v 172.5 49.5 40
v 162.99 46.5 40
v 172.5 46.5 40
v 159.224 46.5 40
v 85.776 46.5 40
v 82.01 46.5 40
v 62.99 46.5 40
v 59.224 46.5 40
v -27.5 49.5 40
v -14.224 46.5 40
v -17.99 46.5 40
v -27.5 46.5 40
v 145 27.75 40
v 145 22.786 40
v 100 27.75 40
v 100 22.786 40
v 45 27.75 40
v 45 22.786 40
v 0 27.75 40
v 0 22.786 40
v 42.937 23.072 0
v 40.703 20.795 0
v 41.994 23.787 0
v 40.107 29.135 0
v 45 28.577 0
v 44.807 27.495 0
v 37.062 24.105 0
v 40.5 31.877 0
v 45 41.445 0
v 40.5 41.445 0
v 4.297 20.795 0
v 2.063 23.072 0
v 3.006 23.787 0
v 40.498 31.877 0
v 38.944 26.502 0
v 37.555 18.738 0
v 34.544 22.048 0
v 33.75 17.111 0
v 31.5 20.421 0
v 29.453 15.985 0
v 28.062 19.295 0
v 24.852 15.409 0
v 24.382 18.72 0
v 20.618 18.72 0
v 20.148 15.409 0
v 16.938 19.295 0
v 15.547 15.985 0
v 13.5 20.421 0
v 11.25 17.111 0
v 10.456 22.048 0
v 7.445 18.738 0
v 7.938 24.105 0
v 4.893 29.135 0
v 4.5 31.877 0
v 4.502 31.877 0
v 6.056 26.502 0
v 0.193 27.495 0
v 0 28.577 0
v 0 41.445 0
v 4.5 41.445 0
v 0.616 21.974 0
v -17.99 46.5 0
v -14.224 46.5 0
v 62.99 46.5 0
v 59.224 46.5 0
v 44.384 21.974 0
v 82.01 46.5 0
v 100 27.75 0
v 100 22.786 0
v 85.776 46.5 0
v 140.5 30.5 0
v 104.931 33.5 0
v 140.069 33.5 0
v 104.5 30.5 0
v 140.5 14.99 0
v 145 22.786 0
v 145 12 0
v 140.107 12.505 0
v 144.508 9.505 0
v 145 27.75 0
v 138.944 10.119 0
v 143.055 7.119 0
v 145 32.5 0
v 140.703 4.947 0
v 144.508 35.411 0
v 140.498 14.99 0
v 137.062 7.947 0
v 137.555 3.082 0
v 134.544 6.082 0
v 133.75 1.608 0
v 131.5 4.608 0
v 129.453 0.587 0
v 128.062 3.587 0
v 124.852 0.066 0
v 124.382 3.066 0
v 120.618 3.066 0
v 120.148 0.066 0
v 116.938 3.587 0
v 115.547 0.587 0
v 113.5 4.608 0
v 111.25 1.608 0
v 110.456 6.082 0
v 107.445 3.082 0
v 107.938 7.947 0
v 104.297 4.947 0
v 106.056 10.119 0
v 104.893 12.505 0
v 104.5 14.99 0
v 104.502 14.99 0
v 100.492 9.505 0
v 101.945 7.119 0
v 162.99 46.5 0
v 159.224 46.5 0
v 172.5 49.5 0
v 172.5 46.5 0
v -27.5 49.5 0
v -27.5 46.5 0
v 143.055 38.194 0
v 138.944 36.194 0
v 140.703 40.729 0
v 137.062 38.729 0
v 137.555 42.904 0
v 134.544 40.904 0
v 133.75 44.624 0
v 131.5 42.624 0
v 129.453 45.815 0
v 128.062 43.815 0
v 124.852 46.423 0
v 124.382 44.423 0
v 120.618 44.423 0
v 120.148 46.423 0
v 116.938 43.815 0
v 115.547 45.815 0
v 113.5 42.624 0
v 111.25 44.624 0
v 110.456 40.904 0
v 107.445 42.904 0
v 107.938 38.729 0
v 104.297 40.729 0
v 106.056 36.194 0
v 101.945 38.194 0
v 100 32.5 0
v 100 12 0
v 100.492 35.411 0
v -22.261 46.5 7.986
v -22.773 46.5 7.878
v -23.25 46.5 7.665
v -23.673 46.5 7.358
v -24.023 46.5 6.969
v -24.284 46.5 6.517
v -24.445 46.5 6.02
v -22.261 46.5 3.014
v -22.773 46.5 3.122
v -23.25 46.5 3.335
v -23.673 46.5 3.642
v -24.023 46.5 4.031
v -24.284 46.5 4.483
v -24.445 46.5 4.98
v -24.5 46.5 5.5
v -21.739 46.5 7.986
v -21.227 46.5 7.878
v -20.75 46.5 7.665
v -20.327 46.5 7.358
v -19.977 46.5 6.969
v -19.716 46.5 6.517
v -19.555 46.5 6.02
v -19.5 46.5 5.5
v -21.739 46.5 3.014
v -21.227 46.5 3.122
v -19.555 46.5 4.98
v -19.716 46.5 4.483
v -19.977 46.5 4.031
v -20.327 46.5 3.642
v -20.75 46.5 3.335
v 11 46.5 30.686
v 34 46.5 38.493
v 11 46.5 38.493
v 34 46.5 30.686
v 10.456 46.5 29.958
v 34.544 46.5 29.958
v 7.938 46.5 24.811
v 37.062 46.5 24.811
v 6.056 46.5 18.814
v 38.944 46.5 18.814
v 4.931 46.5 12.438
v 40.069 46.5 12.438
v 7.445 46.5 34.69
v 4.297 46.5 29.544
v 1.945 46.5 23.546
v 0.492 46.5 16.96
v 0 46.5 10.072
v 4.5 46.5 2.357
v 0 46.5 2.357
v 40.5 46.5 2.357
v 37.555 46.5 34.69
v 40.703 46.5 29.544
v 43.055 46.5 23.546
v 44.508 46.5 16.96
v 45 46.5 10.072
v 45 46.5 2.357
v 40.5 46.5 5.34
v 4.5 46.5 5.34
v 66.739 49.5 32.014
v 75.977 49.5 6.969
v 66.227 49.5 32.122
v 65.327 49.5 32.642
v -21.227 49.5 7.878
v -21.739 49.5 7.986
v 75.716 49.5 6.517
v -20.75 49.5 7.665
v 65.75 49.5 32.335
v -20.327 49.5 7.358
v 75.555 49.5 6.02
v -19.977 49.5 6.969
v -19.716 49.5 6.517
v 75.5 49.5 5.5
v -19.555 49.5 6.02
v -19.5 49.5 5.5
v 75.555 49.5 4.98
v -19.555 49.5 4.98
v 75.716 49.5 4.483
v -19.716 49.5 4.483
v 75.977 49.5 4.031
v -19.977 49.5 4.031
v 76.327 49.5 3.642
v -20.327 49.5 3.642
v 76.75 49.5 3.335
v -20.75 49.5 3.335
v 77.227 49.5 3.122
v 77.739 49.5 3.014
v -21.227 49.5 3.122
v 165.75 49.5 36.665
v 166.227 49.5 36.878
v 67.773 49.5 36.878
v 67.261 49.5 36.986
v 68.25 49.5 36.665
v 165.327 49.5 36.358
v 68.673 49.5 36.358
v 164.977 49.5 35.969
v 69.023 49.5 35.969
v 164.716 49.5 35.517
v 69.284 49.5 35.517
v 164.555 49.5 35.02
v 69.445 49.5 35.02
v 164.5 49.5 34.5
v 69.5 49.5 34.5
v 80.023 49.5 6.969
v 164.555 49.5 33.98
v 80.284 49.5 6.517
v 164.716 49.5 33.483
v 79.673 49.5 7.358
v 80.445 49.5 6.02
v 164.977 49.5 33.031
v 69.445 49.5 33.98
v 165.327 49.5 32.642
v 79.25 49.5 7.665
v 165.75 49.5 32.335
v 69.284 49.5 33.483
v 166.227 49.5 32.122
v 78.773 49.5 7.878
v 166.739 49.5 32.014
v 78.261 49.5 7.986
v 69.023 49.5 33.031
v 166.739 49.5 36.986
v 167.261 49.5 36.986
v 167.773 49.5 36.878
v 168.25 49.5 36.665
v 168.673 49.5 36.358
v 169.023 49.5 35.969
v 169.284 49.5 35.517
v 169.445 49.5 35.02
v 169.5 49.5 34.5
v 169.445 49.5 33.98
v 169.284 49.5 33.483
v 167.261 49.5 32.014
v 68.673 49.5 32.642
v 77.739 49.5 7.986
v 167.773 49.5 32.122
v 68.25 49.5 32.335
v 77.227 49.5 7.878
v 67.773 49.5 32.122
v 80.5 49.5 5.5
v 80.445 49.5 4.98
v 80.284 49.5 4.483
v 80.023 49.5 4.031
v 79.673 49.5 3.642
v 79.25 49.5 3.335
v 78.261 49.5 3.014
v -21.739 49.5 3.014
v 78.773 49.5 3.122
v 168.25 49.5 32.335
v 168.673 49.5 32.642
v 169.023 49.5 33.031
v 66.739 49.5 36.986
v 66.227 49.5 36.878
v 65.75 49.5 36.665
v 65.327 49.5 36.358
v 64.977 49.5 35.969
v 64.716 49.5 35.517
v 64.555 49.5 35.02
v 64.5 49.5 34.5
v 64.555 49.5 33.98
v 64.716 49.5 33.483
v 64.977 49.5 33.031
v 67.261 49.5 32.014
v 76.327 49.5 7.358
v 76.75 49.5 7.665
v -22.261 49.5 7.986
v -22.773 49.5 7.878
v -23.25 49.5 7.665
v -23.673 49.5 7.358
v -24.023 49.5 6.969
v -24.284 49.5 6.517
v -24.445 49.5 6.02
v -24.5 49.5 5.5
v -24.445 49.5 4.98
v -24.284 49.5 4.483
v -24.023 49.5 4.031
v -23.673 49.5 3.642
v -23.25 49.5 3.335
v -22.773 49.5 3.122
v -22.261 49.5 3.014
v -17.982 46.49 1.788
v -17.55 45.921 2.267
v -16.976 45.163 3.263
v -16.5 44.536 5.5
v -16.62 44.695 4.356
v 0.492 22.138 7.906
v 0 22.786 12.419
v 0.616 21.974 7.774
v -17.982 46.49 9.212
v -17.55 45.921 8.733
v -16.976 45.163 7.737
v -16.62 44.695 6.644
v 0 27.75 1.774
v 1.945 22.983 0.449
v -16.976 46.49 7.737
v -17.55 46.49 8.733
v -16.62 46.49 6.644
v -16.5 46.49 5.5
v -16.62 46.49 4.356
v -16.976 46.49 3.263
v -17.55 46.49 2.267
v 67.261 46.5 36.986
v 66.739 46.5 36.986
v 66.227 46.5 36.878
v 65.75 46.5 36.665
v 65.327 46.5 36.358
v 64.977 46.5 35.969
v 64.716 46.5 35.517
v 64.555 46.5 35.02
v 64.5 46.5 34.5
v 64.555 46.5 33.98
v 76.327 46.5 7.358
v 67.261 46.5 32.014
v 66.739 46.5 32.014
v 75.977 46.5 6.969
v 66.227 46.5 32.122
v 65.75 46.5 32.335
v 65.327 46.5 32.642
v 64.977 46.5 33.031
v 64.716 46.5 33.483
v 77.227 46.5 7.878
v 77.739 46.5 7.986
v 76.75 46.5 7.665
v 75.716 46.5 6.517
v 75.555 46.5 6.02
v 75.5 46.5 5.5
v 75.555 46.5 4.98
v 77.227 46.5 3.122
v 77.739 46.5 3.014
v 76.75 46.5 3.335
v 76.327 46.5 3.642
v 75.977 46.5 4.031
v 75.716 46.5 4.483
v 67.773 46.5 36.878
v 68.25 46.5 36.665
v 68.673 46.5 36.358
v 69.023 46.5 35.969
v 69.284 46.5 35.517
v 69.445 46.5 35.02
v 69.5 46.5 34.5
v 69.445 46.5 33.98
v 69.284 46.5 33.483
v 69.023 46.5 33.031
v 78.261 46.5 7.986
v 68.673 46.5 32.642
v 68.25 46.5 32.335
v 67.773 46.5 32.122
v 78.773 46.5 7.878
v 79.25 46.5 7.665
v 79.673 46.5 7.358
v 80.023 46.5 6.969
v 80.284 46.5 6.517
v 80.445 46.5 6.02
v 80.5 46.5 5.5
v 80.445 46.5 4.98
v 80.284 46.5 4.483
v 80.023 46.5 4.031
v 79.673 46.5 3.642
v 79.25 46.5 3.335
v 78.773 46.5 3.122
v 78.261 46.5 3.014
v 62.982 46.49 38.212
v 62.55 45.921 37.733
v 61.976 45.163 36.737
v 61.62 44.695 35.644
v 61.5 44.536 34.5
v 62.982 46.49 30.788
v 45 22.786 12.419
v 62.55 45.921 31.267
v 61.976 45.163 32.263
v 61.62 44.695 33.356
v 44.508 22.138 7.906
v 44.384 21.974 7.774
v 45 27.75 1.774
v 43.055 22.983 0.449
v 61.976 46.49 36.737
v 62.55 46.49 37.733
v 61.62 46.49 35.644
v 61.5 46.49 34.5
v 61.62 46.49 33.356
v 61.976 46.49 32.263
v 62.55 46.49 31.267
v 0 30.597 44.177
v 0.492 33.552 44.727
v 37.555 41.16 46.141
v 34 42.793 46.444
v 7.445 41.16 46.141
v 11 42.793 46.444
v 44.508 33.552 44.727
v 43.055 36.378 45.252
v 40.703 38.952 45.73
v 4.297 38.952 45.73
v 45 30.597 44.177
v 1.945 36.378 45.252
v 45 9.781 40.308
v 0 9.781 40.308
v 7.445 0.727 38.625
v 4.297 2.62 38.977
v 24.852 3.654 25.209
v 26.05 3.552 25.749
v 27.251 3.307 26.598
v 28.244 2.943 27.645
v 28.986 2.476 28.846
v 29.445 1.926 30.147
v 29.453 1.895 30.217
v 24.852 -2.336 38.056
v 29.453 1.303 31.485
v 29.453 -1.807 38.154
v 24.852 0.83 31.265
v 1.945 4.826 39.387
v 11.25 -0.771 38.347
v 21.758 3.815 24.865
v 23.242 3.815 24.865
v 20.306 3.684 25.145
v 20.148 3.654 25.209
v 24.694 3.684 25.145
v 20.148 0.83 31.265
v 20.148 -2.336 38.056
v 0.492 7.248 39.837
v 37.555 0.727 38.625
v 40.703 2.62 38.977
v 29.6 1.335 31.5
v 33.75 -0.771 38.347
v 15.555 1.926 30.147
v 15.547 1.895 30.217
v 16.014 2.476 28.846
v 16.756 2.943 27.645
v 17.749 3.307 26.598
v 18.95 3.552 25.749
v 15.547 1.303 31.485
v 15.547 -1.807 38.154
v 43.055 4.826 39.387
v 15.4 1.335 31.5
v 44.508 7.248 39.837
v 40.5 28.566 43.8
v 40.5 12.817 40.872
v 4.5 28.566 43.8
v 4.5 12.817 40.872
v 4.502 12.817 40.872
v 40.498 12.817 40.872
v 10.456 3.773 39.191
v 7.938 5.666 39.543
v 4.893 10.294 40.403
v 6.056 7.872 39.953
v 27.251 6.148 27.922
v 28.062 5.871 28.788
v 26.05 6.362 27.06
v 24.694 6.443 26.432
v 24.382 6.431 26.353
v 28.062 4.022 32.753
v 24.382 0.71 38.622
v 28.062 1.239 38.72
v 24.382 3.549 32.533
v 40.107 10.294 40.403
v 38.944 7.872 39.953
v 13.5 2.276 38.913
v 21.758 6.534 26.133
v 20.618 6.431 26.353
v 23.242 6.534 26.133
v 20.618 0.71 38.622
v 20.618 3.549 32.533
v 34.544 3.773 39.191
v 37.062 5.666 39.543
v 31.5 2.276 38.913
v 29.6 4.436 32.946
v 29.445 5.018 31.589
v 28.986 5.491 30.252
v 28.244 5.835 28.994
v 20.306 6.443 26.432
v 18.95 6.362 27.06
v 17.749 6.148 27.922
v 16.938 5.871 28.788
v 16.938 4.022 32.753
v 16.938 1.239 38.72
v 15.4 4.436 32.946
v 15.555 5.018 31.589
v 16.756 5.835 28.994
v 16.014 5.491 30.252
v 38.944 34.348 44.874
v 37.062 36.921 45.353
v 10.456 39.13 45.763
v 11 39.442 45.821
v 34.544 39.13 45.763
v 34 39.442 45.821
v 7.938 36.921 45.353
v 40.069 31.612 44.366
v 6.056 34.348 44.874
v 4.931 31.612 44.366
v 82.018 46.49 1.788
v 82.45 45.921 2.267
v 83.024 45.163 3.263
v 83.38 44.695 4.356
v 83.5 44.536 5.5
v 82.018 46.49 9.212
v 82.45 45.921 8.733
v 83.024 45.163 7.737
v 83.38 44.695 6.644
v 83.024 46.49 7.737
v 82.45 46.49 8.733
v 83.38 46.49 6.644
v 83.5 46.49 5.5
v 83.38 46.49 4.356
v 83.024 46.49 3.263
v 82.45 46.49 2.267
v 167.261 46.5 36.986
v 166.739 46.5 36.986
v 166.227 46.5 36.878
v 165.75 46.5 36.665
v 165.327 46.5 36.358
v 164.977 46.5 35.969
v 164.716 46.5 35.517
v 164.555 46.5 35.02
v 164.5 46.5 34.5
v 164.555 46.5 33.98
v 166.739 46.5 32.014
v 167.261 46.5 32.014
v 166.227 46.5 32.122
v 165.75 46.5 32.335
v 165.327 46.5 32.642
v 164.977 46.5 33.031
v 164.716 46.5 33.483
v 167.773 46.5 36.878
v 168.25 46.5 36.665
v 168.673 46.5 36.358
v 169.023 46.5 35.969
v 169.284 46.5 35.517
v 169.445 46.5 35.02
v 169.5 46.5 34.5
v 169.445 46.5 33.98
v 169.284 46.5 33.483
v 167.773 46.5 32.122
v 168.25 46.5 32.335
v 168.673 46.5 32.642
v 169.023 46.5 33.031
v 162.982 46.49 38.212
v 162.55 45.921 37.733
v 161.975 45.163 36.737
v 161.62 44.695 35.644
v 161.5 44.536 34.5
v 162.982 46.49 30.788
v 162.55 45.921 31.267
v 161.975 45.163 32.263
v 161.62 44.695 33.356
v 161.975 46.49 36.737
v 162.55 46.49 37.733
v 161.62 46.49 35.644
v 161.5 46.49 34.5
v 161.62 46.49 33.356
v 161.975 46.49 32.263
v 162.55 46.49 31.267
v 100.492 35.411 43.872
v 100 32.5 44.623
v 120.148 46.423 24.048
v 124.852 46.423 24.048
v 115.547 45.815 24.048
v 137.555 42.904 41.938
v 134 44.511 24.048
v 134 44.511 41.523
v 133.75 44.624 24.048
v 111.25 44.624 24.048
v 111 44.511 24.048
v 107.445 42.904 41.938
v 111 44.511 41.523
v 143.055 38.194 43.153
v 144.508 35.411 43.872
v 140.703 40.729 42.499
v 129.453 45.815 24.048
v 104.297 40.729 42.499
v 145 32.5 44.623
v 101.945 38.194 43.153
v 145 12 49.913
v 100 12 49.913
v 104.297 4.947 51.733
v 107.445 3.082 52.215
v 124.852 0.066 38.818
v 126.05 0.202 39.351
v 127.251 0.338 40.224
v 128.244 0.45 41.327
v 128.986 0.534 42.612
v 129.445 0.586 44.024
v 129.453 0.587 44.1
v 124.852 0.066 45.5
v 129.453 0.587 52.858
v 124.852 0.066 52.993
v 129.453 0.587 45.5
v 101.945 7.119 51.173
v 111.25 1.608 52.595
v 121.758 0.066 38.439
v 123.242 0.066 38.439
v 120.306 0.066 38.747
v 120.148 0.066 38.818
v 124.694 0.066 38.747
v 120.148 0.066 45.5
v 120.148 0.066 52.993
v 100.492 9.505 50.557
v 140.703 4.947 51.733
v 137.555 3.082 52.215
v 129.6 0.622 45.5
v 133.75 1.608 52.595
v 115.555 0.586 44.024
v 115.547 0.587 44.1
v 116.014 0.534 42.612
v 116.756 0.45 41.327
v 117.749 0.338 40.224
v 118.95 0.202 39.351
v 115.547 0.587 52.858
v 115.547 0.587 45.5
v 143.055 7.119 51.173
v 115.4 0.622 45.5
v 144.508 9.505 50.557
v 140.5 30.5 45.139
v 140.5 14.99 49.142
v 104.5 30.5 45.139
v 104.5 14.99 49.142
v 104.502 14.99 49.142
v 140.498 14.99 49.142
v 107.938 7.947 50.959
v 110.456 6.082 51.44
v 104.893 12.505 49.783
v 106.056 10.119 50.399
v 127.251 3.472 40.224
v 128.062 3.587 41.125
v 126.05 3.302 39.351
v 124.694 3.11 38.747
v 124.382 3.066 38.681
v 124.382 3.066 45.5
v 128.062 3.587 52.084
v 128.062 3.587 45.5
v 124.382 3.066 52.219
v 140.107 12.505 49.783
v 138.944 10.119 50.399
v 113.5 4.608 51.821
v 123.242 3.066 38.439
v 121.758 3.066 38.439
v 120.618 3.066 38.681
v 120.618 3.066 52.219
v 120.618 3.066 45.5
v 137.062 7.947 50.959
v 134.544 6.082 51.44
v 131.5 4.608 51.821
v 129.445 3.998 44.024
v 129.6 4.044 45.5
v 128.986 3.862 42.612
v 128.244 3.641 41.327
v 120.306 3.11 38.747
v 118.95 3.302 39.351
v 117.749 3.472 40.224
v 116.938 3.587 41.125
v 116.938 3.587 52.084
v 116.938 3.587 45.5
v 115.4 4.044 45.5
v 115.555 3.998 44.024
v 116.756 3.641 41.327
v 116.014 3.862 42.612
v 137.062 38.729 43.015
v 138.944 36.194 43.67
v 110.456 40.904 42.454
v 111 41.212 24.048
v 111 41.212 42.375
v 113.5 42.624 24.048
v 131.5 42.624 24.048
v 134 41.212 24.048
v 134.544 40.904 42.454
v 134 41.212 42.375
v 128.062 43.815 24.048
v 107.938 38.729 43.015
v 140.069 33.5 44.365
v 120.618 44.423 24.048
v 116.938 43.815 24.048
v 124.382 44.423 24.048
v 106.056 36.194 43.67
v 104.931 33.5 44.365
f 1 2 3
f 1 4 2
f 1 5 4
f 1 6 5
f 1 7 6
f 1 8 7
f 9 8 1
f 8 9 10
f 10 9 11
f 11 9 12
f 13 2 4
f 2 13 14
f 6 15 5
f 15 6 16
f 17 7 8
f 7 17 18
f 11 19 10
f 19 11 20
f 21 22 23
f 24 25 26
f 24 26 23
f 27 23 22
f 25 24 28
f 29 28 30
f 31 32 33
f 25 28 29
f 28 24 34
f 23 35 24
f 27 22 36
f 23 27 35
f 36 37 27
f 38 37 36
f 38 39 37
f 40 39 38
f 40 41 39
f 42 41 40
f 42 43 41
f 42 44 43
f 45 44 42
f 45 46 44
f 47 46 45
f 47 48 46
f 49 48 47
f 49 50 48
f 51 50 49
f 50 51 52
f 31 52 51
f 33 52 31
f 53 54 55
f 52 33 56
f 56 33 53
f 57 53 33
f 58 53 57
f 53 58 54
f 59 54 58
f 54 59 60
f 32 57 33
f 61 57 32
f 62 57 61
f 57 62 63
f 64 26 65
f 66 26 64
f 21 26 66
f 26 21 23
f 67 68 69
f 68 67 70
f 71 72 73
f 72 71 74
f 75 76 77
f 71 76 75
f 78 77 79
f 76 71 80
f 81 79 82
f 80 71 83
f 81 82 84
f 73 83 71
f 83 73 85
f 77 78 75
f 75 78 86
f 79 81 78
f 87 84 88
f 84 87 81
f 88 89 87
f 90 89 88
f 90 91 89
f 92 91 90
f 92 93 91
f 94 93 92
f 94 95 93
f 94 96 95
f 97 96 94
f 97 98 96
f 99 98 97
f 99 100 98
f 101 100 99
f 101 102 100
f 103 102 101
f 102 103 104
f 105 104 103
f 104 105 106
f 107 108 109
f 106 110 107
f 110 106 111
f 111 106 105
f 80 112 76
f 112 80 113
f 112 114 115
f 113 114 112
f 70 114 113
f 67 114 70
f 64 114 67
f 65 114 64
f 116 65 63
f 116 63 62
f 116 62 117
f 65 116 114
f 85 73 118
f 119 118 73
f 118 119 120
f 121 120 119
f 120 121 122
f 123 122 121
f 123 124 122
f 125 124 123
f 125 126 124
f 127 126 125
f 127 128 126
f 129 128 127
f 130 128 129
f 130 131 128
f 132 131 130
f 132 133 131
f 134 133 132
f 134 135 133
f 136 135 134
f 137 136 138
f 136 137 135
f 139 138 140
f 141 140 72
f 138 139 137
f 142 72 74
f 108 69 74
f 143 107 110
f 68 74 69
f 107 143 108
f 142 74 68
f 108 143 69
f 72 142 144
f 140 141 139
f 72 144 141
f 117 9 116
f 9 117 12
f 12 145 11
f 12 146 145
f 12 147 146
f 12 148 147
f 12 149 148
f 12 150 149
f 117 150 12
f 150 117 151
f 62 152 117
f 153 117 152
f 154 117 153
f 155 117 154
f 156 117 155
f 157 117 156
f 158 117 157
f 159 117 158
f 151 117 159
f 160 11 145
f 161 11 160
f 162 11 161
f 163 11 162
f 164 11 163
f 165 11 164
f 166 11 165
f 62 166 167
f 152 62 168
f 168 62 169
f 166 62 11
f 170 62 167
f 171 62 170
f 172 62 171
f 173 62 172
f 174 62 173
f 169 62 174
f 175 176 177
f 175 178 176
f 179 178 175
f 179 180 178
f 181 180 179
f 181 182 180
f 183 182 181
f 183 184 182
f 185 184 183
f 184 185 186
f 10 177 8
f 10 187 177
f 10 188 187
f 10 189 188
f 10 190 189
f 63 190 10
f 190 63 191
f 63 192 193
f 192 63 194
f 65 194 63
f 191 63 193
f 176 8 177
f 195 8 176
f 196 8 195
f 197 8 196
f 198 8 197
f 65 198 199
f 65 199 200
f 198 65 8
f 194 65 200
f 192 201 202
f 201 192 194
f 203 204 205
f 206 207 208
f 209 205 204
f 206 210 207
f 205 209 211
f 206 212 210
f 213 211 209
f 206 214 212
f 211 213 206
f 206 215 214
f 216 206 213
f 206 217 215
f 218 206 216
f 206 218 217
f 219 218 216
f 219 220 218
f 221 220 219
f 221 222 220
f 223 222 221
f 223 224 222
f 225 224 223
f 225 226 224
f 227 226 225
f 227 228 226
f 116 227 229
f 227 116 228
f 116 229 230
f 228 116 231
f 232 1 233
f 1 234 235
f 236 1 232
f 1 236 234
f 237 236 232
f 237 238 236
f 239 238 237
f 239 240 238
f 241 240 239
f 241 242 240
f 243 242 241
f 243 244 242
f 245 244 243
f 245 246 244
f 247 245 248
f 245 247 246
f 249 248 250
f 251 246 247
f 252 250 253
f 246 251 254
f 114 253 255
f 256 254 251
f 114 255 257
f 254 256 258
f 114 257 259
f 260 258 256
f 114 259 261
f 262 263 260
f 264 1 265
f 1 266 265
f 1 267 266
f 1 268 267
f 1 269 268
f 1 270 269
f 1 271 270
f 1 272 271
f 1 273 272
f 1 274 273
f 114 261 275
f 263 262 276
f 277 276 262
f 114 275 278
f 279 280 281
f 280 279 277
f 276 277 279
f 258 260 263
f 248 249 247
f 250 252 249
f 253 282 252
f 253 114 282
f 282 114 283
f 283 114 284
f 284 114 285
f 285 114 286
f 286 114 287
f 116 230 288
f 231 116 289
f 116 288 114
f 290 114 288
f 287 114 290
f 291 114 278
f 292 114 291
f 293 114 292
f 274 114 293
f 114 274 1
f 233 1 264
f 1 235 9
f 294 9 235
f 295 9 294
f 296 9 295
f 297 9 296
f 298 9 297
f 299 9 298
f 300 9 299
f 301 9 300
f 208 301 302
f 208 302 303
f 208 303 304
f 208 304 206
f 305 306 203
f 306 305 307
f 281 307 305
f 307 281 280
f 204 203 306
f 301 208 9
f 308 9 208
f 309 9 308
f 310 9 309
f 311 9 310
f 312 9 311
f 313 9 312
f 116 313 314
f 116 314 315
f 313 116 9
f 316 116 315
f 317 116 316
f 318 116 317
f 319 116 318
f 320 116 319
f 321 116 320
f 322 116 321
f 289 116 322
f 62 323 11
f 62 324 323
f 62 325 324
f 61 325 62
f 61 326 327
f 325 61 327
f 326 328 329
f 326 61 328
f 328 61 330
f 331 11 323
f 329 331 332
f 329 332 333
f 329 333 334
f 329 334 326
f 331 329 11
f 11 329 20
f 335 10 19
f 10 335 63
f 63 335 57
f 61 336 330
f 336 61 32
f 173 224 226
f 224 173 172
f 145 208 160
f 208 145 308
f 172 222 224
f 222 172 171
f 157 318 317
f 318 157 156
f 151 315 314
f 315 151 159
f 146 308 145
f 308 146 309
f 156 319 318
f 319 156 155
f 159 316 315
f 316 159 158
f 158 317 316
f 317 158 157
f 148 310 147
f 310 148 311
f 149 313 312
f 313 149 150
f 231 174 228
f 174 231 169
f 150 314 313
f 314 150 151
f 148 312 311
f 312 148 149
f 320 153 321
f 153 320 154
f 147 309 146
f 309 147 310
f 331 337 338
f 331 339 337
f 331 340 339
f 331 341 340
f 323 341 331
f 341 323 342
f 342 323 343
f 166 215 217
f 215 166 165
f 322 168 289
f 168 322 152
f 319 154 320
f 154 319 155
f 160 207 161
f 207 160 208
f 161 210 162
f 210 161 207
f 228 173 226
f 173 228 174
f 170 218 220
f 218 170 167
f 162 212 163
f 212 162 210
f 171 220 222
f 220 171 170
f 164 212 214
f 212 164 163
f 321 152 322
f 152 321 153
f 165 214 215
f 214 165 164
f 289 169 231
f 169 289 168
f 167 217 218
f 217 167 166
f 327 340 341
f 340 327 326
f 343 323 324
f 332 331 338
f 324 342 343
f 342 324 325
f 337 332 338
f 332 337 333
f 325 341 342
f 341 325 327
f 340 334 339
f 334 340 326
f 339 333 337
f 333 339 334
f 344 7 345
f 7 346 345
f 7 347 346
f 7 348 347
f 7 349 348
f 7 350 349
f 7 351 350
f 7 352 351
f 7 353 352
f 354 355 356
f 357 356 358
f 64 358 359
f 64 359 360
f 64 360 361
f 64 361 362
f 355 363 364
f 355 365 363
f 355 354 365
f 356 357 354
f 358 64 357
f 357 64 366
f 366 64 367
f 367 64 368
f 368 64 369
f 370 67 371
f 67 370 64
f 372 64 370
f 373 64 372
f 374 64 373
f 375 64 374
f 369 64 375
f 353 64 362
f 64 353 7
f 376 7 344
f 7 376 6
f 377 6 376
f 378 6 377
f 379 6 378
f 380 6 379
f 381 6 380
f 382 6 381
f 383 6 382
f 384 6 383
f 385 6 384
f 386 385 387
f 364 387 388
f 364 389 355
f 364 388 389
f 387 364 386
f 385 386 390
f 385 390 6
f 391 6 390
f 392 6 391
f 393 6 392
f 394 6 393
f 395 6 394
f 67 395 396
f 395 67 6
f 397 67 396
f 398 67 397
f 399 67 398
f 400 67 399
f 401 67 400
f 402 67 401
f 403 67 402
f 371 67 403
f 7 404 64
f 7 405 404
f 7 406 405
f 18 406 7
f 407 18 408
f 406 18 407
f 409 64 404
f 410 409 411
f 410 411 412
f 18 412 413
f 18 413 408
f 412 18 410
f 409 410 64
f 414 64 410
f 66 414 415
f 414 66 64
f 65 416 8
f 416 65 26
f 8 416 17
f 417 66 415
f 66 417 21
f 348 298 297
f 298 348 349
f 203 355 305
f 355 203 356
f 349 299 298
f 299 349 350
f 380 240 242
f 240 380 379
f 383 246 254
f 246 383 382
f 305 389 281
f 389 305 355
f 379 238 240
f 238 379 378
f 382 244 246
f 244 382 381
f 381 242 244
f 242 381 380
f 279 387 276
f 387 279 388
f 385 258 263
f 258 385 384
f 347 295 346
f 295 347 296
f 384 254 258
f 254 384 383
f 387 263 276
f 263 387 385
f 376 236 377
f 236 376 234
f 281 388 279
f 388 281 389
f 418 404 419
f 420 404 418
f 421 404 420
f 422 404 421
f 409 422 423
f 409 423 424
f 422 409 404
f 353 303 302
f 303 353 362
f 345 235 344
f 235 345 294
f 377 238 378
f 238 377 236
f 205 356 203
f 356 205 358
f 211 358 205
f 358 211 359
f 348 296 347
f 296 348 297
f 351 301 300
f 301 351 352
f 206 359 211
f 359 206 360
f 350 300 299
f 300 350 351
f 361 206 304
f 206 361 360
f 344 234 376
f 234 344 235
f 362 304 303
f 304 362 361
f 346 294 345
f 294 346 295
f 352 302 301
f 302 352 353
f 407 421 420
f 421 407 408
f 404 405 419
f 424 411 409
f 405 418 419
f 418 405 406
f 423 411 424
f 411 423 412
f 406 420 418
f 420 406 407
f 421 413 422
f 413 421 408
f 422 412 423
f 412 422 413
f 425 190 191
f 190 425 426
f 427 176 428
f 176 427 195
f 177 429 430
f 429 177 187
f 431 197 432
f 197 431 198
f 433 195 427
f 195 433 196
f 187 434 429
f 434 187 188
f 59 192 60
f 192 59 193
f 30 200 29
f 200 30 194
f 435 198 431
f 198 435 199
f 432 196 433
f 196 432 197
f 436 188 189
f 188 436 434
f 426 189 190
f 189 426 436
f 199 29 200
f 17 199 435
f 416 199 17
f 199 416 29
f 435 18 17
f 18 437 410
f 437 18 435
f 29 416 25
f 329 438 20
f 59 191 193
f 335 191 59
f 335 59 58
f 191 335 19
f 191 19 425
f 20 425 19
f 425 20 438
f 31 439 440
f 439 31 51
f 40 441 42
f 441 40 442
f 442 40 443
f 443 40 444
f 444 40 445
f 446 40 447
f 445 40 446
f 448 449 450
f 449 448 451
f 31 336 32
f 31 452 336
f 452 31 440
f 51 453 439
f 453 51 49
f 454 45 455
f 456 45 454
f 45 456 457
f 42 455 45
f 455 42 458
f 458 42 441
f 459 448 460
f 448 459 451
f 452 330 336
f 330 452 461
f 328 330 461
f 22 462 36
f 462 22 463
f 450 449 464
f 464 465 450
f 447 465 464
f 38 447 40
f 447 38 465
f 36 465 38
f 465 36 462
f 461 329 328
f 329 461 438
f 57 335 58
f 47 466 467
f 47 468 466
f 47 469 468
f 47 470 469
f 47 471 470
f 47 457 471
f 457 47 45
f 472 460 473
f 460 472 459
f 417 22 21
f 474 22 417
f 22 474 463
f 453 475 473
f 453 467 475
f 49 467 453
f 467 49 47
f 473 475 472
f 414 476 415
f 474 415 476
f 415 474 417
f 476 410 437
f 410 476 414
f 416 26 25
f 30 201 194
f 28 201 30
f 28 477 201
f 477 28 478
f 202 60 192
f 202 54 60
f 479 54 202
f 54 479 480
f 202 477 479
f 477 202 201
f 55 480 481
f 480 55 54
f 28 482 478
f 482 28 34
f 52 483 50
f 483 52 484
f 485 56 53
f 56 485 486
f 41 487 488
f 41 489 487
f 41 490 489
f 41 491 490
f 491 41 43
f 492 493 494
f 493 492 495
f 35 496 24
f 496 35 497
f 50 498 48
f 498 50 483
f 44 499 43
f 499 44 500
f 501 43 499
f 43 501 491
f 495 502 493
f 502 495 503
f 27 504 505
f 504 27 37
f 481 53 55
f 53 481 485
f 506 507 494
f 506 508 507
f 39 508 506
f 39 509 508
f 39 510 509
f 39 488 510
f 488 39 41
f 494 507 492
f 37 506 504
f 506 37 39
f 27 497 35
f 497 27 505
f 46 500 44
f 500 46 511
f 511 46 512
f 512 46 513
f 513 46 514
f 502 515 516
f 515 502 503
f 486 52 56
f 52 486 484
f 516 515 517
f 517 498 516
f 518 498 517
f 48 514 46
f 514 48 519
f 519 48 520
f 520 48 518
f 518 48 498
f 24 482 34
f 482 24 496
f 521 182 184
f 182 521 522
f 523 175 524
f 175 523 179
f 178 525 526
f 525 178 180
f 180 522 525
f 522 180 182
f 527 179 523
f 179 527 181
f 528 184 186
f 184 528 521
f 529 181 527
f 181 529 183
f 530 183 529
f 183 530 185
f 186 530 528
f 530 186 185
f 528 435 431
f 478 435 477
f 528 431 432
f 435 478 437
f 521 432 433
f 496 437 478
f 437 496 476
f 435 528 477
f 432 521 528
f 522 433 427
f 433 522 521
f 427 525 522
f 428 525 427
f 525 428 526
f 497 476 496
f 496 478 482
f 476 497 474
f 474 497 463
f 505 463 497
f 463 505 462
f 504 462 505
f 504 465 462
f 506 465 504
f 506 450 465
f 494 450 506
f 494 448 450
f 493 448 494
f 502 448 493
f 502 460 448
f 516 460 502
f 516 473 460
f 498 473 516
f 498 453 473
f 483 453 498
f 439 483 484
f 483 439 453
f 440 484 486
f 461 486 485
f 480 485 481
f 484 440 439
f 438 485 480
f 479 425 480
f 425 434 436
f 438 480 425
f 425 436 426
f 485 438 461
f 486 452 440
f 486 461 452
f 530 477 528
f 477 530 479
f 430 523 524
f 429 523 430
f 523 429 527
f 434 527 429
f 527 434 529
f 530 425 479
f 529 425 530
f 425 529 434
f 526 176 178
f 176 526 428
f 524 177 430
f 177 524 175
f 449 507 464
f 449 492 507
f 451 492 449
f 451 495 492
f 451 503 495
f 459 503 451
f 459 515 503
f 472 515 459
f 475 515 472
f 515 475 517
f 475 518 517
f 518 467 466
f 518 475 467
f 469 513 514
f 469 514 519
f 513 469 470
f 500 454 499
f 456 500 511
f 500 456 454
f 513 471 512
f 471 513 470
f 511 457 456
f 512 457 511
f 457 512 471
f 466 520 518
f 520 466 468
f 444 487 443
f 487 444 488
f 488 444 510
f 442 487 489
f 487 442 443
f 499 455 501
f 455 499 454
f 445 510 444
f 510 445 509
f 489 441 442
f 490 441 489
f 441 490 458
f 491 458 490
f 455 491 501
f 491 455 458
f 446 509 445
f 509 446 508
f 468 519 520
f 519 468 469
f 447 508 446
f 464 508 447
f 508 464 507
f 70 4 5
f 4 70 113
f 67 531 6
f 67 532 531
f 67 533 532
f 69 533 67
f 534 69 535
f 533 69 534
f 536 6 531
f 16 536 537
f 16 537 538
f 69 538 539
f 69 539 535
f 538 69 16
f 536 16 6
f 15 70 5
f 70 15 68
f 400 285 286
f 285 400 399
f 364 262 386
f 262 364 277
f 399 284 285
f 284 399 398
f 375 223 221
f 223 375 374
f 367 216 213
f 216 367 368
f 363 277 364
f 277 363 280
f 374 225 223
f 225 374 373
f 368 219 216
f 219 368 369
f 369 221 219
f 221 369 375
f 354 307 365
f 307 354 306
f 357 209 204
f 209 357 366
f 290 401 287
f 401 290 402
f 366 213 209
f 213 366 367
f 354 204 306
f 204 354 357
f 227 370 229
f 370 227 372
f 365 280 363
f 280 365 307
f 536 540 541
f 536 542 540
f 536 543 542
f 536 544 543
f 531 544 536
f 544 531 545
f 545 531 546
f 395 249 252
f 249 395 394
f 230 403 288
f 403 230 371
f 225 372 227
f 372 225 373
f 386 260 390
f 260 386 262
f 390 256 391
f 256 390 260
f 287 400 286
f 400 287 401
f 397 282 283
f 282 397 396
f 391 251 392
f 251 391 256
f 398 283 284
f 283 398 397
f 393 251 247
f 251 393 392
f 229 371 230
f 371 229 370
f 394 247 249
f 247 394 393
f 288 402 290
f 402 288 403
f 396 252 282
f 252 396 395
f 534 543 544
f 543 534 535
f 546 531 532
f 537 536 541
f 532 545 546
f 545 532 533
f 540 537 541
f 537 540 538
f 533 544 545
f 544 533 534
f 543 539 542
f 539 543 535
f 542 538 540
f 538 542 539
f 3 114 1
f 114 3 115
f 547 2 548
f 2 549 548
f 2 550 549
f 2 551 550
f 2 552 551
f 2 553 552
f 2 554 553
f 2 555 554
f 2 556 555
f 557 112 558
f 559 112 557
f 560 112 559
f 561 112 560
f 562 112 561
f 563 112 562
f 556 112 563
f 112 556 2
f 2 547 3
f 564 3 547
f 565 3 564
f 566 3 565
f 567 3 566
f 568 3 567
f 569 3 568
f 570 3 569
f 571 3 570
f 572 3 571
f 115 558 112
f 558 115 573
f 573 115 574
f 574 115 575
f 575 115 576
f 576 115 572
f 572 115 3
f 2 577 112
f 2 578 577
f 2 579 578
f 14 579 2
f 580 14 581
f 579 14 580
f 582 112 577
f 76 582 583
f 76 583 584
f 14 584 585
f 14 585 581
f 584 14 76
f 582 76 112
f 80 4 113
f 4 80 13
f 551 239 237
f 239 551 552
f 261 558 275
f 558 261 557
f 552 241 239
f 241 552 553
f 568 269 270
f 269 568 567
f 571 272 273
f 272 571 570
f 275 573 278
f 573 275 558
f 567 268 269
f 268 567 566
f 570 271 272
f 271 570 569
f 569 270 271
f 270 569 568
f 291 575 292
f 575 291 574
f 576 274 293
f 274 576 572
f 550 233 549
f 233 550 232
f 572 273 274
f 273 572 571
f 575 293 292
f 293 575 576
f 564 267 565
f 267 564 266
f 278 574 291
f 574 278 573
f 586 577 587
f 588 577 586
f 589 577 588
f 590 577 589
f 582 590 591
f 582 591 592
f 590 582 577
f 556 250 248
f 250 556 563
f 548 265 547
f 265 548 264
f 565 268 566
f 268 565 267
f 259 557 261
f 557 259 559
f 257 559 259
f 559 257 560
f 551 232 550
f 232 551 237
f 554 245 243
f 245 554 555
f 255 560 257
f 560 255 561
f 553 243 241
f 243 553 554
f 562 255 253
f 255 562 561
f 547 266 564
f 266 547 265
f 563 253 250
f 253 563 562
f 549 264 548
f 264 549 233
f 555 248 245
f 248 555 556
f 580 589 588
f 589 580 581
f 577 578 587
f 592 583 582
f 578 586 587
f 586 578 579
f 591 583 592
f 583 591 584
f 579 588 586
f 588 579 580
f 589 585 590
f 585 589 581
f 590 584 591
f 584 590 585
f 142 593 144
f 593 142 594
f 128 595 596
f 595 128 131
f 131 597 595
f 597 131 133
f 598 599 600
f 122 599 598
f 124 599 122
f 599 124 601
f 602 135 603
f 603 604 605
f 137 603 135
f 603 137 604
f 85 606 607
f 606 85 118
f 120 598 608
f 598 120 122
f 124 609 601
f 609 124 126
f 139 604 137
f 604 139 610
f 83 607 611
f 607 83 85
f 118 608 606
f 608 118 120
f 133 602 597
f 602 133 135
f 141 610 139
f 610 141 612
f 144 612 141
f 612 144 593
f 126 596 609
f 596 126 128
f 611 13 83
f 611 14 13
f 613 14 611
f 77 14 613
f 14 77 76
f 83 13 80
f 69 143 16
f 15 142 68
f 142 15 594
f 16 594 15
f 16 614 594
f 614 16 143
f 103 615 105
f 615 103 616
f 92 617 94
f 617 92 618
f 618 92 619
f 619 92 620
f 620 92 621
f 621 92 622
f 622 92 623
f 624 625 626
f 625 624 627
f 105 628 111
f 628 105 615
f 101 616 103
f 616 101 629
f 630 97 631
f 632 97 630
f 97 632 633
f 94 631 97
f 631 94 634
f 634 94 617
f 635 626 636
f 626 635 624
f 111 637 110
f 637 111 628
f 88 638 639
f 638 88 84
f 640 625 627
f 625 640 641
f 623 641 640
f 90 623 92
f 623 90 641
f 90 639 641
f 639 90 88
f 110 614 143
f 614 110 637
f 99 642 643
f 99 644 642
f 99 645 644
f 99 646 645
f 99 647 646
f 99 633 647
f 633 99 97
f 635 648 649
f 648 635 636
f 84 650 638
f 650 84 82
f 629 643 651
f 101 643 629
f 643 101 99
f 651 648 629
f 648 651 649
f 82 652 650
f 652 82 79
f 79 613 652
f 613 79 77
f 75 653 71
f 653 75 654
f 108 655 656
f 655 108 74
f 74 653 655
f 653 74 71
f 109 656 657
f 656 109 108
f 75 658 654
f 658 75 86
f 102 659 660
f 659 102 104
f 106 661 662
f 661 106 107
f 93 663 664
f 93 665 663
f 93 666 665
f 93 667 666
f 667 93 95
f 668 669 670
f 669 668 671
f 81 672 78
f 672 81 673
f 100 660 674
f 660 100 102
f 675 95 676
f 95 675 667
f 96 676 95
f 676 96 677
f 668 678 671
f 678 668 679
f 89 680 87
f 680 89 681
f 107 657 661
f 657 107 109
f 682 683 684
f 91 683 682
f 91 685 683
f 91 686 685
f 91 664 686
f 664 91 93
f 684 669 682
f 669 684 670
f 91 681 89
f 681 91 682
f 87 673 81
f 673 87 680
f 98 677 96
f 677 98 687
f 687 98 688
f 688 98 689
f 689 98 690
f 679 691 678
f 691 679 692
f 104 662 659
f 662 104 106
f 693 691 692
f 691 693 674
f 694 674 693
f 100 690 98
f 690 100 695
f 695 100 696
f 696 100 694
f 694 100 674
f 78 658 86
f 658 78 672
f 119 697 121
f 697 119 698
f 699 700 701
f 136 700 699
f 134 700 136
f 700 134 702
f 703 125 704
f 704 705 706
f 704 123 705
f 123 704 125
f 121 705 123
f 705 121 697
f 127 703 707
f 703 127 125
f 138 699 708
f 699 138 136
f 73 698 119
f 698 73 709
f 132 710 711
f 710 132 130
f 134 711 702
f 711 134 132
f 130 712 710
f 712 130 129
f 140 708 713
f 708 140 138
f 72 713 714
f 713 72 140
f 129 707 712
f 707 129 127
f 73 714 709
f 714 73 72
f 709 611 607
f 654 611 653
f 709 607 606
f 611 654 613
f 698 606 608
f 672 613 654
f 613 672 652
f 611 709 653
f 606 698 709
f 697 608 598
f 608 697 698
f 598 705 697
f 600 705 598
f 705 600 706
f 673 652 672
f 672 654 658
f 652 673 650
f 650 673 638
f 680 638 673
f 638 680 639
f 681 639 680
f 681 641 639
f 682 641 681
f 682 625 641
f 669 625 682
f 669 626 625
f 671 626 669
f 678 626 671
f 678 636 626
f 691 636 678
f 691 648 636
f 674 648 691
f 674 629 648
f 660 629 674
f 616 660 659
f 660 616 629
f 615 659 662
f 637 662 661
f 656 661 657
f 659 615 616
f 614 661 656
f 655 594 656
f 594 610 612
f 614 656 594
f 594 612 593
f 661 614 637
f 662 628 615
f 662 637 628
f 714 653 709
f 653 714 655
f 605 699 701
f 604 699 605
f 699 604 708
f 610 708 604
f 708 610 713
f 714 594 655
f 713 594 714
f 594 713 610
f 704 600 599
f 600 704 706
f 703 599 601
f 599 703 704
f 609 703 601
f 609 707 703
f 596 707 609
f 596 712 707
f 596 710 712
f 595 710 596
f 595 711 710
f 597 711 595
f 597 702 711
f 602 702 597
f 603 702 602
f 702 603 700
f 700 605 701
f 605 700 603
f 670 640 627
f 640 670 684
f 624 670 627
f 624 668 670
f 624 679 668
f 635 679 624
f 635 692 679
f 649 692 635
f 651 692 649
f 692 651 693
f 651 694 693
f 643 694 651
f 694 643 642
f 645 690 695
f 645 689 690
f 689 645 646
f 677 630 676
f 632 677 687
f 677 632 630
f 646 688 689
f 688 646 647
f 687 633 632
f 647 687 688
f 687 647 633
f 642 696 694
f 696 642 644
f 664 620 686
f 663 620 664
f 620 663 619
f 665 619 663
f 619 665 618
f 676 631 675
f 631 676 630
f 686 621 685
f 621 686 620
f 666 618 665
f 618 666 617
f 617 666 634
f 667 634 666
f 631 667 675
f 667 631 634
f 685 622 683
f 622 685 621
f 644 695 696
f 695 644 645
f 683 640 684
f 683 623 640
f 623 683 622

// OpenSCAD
/**
 * SPDX-FileCopyrightText: 2024 Simon Redman <simon@ergotech.com>
 *
 * SPDX-License-Identifier: GPL-2.0-only OR GPL-3.0-only
 */

// The number of accessory holders to produce
numAccessoryHolders = 2; // [1:10]

// The depth of the cavity which contains the accessory. 53mm is just enough to fully contain the nozzle on my accessories.
holderDepth = 53; // [15:60]

// The center-to-center distance between accessory holders, in mm. 135mm is about right for a floor roller.
accessoryHolderSpacing = 100; //[75:200]

// The height of the structure between the accessory holders
wallPlateHeight = 40; // [10:53]

// The size of the screw holes, in mm. Be sure to include necessary clearance. 5mm corresponds to roughly a #10 SAE screw. Set to zero for no screw holes.
screwHoleDiameter = 5; // [0:10]

// Screw head size, in mm. Set this to the size of the screws you plan to use for mounting. Zero for no screw head clearance.
screwHeadDiameter = 11; // [0:50]

/* [Hidden] */

// Measured Constants. May be useful to change these to make accessory holders for slightly-different vacuums.
// I am defining the nozzle as the part of the accessory which goes into the vacuum, and the shell as the part of the accessory which is outside of the vacuum (the clip is on the shell).
// All units in millimeters.

// The longer measurement of the accessory nozzle, perpendicular to the acuation direction of the clip.
nozzleLongDimension = 36.0;

// The shorter measurement of the accessory nozzle, parallel to the actuation direction of the clip.
nozzleShortDimension = 27.5;

// The measurement of the shell in the same axis as the nozzleLongDimension.
shellOutsideLongDimension = 45.0;

// The measurement of the shell in the same axis as the nozzleShortDimension.
shellOutsideShortDimension = 46.5;

// The size of the "clippy" part of the clip, same axis as nozzleLongDimension.
clipInnerWidth = 14.2;

// The height of the "clippy" part of the clip, parallel to the long axis of the accessory.
clipInnerHeight = 5.0;

// The clearance needed for the clip to swing. Same axis as the nozzleShortDimension.
clipThickness = 9.0;

// The height of the clip from the shell. There should be a cutout starting here.
clipHeight = 7.5;

// The distance between the nozzle and the outer shell, measured at the point of the clip. The clip would clip in here.
nozzleShellClipDistance = 3;

// The distance between the nozzle and the outer shell, measured on the opposite size from the clip.
nozzleShellRearDistance = 17.0;

// The shell runs at an angle, with the lowest part at the clip and the highest part opposite the clip. This is the change in height between the shell at the clip, and the shell at opposite side.
shellRearHeightLoss = 12.0;

// The rear shell footprint is roughly an oval with the long diameter of shellOutsideLongDimension and the short radius of this value.
// Controls the round-ness of the rear of the accessory holder.
shellRearShortRadius = 14.0;

// The front shell footprint is roughly an oval with the long diameter of shellOutsideLongDimension and the short radius of this value.
// Controls the round-ness of the front of the accessory holder.
shellFrontShortRadius = 12.0;

// Some accessories, like the floor rollers, have a plug to carry power from the vacuum to the acessory. Make space for that.
powerPlugLength = 23.0;
powerPlugWidth = 10.0;
powerPlugHeight = 18.5;

// Constants

// Epsilon, used as a fudge factor when making floating point comparisons, such as in union and difference functions.
eps = 0.01;

// Whenever we produce a shell which just needs to look pretty, it should be this thick.
cosmeticShellThickness = 2.0;

// Whenever we produce a shell which actually needs to do something, it should be this thick.
structuralShellThickness = 3.0;

// Make a partial circle of the given height. Scale the result to fit your needs.
// @param a: Angle in degrees
// @param r: Cylinder radius
// @param h: Cylinder height
// @return A semi-cylinder of height h and radius r
module cylinderSlice(r, h, a){
  scale([r, r, h])
  scale([1/100, 1/100, 1]) // Make the original radius 100, then scale back to 1, to get a reasonable number of faces since scad represents circles as polygons.
  rotate_extrude(angle=a) square([100,1]);
}

// Make a single accessory holder
module makeAccessoryHolder() {
    // Create the main body of the accessory holder
    difference() {
         // Outer shell
        union() {
          // Rear rounding
          translate([
            shellOutsideLongDimension / 2,
            shellOutsideShortDimension - shellRearShortRadius,
            0
          ])
          
          scale([shellOutsideLongDimension / 2, shellRearShortRadius, holderDepth])
          cylinderSlice(r=1, h=1, a=180);
          // Squared middle
          translate([0, shellFrontShortRadius, 0])
          cube([shellOutsideLongDimension, shellOutsideShortDimension - shellRearShortRadius - shellFrontShortRadius, holderDepth]);
          // Front rounding
          translate([shellOutsideLongDimension / 2, shellFrontShortRadius, 0])
          rotate(180, [0, 0, 1])
          scale([shellOutsideLongDimension / 2, shellFrontShortRadius, holderDepth])
          cylinderSlice(r=1, h=1, a=180);
        }

        // Cutout for the accessory nozzle
        translate([
          (shellOutsideLongDimension - nozzleLongDimension)/2, nozzleShellClipDistance, -eps
        ])
        union() {
          translate([0, shellFrontShortRadius - eps, 0])
          cube([nozzleLongDimension, nozzleShortDimension- shellFrontShortRadius + eps, holderDepth + 2*eps]);
          translate([
            nozzleLongDimension / 2,
            shellFrontShortRadius,
            -eps
          ])
          rotate(180, [0, 0, 1])
          scale([nozzleLongDimension / 2, shellFrontShortRadius, holderDepth + 2*eps])
          cylinderSlice(r=1, h=1, a=180);
        }

        // Cut off the top at an angle
        // Use an absurdly tall cube, rotated to the appropriate angle, to make this cut.
        cutAngle = atan(shellRearHeightLoss/shellOutsideShortDimension);
        translate([
          -eps,
          0,
          holderDepth + eps
        ])
        rotate(-1 * cutAngle, [1, 0, 0])
        cube([
          shellOutsideLongDimension * 2,
          shellOutsideShortDimension * 2,
          holderDepth * 2
        ]);

        // Cutout the back area, so as not to waste materials when printing
        translate([
          (shellOutsideLongDimension - nozzleLongDimension)/2,
          nozzleShellClipDistance + nozzleShortDimension + structuralShellThickness,
          -eps
        ])
        difference() {
          // Trim the part which will be used to make the cutout, to make sure the structural shell part is not removed
          union() {
            // Join a semi-cylinder with a cube to make the cutout
            wasteSize = shellOutsideShortDimension - nozzleShellClipDistance - nozzleShortDimension - cosmeticShellThickness - structuralShellThickness;
            translate([
              nozzleLongDimension / 2,
              wasteSize - shellRearShortRadius,
              0
            ])
            scale([nozzleLongDimension / 2, shellRearShortRadius, 1])
            cylinderSlice(r=1, h=holderDepth + 2*eps, a=180);

            cube([
              nozzleLongDimension,
              wasteSize - shellRearShortRadius + eps,
              holderDepth + 2*eps
            ]);
          }

          translate([0, -structuralShellThickness, 0])
          cube([nozzleLongDimension, structuralShellThickness, holderDepth]);
        }

        // Cutout for the power plug
        translate([
          shellOutsideLongDimension/2 - powerPlugLength / 2,
          shellOutsideShortDimension - powerPlugWidth + eps,
          holderDepth - shellRearHeightLoss - powerPlugHeight + structuralShellThickness * 2 * tan(cutAngle)
        ])
        cube([powerPlugLength, powerPlugWidth, powerPlugHeight]);

        // Cutout for the clip
        translate([
          (shellOutsideLongDimension)/2,
          nozzleShellClipDistance + shellFrontShortRadius + 2*eps,
          holderDepth - clipHeight
        ])
        rotate([90, 180, 0])
        difference() {
          cylinderSlice(r=clipInnerWidth/2, h=nozzleShellClipDistance + shellFrontShortRadius + 2*eps, a=180);
        }
    }
}

//warning: not parameterised!
module makeCantedAccessoryHolder() {
    difference() {
        //move to compensate for rotation below
        translate([0, 20, -10])
        //rotate forward to give clearance for dust want
        rotate([25, 0, 0])
        makeAccessoryHolder();
        
        //remove parts which are now outside the envelope of the straight piece
        union() {
            //everything behind the wall pate
            translate([0, 49, 0])
            cube(50);
            
            //everything below the z origin
            translate([0, 0, -50])
            cube(50);
        }
    }
}

module makeWallPlate() {
  difference() {
    union() {
      wallPlateSize = accessoryHolderSpacing/2;
      // The main, back part of the wall plate
      cube([wallPlateSize + eps, structuralShellThickness, wallPlateHeight]);

      // Pick the angle such that the brace will meet the center of the accessory holder and leave enough space for a screw.
      wallDistanceToBrace = wallPlateSize - (shellOutsideLongDimension / 2) - screwHeadDiameter;
      heightFromWallToBrace = (shellOutsideShortDimension - structuralShellThickness) / 2;
      wallBraceAngle = atan(heightFromWallToBrace / wallDistanceToBrace);

      wallBraceLength = heightFromWallToBrace / sin(wallBraceAngle) + structuralShellThickness / cos(wallBraceAngle);

      // The structural angle brace of the wall plate
      translate([screwHeadDiameter, 0, 0])
      rotate(wallBraceAngle, [0, 0, 1])
      cube([wallBraceLength + eps, structuralShellThickness, wallPlateHeight]);
    }

    // Screw hole
    translate([screwHeadDiameter / 2, -eps, screwHeadDiameter/2])
    rotate(-90, [1, 0, 0])
    union() {
      // The screw shaft. Only as thick as the structure, since that's what it's supposed to be going through.
      cylinderSlice(r = screwHoleDiameter/2, h = structuralShellThickness + 2*eps, a=360);
    translate([0, 0, structuralShellThickness + 2*eps])
      // The screw head - Make it really tall so it will cut through the braces if the distance between accessories is really small.
      cylinderSlice(r = screwHeadDiameter/2, h = shellOutsideShortDimension, a=360);
    }
  }
}

module makePart() {
  for (i = [0:numAccessoryHolders - 1]) {
    // Place the wall plate
    for (wallPlateIdx = [0:1]) {
      translate([i*accessoryHolderSpacing, shellOutsideShortDimension+structuralShellThickness, 0]) // Move the accessory plate to the appropriate wall mount
      translate([(1 * wallPlateIdx - 1)*accessoryHolderSpacing / 4, 0, 0]) // Move the accessory plate to the correct location
      translate([(1 * wallPlateIdx - 1) * accessoryHolderSpacing / 4 + shellOutsideLongDimension / 2, 0, 0]) // Center the wall plate on the accessory mount
      // Correct the second half for having been rotated over the X axis
      translate([(1*wallPlateIdx)*accessoryHolderSpacing/2, 0, (1*wallPlateIdx) * wallPlateHeight])
      mirror([(1*wallPlateIdx), 0, 0]) // Mirror the second mount half
      mirror([0, 0, (1*wallPlateIdx)])
      mirror([0, 1, 0])
      makeWallPlate();
    }

    // Place an accessory holder
    translate([i*(accessoryHolderSpacing), 0, 0])
    
    if (i==0) {
        //this one is canted
        makeCantedAccessoryHolder();
    }
    else
    {
        //the rest are straight
        makeAccessoryHolder();
    }
  }
}

makePart();
